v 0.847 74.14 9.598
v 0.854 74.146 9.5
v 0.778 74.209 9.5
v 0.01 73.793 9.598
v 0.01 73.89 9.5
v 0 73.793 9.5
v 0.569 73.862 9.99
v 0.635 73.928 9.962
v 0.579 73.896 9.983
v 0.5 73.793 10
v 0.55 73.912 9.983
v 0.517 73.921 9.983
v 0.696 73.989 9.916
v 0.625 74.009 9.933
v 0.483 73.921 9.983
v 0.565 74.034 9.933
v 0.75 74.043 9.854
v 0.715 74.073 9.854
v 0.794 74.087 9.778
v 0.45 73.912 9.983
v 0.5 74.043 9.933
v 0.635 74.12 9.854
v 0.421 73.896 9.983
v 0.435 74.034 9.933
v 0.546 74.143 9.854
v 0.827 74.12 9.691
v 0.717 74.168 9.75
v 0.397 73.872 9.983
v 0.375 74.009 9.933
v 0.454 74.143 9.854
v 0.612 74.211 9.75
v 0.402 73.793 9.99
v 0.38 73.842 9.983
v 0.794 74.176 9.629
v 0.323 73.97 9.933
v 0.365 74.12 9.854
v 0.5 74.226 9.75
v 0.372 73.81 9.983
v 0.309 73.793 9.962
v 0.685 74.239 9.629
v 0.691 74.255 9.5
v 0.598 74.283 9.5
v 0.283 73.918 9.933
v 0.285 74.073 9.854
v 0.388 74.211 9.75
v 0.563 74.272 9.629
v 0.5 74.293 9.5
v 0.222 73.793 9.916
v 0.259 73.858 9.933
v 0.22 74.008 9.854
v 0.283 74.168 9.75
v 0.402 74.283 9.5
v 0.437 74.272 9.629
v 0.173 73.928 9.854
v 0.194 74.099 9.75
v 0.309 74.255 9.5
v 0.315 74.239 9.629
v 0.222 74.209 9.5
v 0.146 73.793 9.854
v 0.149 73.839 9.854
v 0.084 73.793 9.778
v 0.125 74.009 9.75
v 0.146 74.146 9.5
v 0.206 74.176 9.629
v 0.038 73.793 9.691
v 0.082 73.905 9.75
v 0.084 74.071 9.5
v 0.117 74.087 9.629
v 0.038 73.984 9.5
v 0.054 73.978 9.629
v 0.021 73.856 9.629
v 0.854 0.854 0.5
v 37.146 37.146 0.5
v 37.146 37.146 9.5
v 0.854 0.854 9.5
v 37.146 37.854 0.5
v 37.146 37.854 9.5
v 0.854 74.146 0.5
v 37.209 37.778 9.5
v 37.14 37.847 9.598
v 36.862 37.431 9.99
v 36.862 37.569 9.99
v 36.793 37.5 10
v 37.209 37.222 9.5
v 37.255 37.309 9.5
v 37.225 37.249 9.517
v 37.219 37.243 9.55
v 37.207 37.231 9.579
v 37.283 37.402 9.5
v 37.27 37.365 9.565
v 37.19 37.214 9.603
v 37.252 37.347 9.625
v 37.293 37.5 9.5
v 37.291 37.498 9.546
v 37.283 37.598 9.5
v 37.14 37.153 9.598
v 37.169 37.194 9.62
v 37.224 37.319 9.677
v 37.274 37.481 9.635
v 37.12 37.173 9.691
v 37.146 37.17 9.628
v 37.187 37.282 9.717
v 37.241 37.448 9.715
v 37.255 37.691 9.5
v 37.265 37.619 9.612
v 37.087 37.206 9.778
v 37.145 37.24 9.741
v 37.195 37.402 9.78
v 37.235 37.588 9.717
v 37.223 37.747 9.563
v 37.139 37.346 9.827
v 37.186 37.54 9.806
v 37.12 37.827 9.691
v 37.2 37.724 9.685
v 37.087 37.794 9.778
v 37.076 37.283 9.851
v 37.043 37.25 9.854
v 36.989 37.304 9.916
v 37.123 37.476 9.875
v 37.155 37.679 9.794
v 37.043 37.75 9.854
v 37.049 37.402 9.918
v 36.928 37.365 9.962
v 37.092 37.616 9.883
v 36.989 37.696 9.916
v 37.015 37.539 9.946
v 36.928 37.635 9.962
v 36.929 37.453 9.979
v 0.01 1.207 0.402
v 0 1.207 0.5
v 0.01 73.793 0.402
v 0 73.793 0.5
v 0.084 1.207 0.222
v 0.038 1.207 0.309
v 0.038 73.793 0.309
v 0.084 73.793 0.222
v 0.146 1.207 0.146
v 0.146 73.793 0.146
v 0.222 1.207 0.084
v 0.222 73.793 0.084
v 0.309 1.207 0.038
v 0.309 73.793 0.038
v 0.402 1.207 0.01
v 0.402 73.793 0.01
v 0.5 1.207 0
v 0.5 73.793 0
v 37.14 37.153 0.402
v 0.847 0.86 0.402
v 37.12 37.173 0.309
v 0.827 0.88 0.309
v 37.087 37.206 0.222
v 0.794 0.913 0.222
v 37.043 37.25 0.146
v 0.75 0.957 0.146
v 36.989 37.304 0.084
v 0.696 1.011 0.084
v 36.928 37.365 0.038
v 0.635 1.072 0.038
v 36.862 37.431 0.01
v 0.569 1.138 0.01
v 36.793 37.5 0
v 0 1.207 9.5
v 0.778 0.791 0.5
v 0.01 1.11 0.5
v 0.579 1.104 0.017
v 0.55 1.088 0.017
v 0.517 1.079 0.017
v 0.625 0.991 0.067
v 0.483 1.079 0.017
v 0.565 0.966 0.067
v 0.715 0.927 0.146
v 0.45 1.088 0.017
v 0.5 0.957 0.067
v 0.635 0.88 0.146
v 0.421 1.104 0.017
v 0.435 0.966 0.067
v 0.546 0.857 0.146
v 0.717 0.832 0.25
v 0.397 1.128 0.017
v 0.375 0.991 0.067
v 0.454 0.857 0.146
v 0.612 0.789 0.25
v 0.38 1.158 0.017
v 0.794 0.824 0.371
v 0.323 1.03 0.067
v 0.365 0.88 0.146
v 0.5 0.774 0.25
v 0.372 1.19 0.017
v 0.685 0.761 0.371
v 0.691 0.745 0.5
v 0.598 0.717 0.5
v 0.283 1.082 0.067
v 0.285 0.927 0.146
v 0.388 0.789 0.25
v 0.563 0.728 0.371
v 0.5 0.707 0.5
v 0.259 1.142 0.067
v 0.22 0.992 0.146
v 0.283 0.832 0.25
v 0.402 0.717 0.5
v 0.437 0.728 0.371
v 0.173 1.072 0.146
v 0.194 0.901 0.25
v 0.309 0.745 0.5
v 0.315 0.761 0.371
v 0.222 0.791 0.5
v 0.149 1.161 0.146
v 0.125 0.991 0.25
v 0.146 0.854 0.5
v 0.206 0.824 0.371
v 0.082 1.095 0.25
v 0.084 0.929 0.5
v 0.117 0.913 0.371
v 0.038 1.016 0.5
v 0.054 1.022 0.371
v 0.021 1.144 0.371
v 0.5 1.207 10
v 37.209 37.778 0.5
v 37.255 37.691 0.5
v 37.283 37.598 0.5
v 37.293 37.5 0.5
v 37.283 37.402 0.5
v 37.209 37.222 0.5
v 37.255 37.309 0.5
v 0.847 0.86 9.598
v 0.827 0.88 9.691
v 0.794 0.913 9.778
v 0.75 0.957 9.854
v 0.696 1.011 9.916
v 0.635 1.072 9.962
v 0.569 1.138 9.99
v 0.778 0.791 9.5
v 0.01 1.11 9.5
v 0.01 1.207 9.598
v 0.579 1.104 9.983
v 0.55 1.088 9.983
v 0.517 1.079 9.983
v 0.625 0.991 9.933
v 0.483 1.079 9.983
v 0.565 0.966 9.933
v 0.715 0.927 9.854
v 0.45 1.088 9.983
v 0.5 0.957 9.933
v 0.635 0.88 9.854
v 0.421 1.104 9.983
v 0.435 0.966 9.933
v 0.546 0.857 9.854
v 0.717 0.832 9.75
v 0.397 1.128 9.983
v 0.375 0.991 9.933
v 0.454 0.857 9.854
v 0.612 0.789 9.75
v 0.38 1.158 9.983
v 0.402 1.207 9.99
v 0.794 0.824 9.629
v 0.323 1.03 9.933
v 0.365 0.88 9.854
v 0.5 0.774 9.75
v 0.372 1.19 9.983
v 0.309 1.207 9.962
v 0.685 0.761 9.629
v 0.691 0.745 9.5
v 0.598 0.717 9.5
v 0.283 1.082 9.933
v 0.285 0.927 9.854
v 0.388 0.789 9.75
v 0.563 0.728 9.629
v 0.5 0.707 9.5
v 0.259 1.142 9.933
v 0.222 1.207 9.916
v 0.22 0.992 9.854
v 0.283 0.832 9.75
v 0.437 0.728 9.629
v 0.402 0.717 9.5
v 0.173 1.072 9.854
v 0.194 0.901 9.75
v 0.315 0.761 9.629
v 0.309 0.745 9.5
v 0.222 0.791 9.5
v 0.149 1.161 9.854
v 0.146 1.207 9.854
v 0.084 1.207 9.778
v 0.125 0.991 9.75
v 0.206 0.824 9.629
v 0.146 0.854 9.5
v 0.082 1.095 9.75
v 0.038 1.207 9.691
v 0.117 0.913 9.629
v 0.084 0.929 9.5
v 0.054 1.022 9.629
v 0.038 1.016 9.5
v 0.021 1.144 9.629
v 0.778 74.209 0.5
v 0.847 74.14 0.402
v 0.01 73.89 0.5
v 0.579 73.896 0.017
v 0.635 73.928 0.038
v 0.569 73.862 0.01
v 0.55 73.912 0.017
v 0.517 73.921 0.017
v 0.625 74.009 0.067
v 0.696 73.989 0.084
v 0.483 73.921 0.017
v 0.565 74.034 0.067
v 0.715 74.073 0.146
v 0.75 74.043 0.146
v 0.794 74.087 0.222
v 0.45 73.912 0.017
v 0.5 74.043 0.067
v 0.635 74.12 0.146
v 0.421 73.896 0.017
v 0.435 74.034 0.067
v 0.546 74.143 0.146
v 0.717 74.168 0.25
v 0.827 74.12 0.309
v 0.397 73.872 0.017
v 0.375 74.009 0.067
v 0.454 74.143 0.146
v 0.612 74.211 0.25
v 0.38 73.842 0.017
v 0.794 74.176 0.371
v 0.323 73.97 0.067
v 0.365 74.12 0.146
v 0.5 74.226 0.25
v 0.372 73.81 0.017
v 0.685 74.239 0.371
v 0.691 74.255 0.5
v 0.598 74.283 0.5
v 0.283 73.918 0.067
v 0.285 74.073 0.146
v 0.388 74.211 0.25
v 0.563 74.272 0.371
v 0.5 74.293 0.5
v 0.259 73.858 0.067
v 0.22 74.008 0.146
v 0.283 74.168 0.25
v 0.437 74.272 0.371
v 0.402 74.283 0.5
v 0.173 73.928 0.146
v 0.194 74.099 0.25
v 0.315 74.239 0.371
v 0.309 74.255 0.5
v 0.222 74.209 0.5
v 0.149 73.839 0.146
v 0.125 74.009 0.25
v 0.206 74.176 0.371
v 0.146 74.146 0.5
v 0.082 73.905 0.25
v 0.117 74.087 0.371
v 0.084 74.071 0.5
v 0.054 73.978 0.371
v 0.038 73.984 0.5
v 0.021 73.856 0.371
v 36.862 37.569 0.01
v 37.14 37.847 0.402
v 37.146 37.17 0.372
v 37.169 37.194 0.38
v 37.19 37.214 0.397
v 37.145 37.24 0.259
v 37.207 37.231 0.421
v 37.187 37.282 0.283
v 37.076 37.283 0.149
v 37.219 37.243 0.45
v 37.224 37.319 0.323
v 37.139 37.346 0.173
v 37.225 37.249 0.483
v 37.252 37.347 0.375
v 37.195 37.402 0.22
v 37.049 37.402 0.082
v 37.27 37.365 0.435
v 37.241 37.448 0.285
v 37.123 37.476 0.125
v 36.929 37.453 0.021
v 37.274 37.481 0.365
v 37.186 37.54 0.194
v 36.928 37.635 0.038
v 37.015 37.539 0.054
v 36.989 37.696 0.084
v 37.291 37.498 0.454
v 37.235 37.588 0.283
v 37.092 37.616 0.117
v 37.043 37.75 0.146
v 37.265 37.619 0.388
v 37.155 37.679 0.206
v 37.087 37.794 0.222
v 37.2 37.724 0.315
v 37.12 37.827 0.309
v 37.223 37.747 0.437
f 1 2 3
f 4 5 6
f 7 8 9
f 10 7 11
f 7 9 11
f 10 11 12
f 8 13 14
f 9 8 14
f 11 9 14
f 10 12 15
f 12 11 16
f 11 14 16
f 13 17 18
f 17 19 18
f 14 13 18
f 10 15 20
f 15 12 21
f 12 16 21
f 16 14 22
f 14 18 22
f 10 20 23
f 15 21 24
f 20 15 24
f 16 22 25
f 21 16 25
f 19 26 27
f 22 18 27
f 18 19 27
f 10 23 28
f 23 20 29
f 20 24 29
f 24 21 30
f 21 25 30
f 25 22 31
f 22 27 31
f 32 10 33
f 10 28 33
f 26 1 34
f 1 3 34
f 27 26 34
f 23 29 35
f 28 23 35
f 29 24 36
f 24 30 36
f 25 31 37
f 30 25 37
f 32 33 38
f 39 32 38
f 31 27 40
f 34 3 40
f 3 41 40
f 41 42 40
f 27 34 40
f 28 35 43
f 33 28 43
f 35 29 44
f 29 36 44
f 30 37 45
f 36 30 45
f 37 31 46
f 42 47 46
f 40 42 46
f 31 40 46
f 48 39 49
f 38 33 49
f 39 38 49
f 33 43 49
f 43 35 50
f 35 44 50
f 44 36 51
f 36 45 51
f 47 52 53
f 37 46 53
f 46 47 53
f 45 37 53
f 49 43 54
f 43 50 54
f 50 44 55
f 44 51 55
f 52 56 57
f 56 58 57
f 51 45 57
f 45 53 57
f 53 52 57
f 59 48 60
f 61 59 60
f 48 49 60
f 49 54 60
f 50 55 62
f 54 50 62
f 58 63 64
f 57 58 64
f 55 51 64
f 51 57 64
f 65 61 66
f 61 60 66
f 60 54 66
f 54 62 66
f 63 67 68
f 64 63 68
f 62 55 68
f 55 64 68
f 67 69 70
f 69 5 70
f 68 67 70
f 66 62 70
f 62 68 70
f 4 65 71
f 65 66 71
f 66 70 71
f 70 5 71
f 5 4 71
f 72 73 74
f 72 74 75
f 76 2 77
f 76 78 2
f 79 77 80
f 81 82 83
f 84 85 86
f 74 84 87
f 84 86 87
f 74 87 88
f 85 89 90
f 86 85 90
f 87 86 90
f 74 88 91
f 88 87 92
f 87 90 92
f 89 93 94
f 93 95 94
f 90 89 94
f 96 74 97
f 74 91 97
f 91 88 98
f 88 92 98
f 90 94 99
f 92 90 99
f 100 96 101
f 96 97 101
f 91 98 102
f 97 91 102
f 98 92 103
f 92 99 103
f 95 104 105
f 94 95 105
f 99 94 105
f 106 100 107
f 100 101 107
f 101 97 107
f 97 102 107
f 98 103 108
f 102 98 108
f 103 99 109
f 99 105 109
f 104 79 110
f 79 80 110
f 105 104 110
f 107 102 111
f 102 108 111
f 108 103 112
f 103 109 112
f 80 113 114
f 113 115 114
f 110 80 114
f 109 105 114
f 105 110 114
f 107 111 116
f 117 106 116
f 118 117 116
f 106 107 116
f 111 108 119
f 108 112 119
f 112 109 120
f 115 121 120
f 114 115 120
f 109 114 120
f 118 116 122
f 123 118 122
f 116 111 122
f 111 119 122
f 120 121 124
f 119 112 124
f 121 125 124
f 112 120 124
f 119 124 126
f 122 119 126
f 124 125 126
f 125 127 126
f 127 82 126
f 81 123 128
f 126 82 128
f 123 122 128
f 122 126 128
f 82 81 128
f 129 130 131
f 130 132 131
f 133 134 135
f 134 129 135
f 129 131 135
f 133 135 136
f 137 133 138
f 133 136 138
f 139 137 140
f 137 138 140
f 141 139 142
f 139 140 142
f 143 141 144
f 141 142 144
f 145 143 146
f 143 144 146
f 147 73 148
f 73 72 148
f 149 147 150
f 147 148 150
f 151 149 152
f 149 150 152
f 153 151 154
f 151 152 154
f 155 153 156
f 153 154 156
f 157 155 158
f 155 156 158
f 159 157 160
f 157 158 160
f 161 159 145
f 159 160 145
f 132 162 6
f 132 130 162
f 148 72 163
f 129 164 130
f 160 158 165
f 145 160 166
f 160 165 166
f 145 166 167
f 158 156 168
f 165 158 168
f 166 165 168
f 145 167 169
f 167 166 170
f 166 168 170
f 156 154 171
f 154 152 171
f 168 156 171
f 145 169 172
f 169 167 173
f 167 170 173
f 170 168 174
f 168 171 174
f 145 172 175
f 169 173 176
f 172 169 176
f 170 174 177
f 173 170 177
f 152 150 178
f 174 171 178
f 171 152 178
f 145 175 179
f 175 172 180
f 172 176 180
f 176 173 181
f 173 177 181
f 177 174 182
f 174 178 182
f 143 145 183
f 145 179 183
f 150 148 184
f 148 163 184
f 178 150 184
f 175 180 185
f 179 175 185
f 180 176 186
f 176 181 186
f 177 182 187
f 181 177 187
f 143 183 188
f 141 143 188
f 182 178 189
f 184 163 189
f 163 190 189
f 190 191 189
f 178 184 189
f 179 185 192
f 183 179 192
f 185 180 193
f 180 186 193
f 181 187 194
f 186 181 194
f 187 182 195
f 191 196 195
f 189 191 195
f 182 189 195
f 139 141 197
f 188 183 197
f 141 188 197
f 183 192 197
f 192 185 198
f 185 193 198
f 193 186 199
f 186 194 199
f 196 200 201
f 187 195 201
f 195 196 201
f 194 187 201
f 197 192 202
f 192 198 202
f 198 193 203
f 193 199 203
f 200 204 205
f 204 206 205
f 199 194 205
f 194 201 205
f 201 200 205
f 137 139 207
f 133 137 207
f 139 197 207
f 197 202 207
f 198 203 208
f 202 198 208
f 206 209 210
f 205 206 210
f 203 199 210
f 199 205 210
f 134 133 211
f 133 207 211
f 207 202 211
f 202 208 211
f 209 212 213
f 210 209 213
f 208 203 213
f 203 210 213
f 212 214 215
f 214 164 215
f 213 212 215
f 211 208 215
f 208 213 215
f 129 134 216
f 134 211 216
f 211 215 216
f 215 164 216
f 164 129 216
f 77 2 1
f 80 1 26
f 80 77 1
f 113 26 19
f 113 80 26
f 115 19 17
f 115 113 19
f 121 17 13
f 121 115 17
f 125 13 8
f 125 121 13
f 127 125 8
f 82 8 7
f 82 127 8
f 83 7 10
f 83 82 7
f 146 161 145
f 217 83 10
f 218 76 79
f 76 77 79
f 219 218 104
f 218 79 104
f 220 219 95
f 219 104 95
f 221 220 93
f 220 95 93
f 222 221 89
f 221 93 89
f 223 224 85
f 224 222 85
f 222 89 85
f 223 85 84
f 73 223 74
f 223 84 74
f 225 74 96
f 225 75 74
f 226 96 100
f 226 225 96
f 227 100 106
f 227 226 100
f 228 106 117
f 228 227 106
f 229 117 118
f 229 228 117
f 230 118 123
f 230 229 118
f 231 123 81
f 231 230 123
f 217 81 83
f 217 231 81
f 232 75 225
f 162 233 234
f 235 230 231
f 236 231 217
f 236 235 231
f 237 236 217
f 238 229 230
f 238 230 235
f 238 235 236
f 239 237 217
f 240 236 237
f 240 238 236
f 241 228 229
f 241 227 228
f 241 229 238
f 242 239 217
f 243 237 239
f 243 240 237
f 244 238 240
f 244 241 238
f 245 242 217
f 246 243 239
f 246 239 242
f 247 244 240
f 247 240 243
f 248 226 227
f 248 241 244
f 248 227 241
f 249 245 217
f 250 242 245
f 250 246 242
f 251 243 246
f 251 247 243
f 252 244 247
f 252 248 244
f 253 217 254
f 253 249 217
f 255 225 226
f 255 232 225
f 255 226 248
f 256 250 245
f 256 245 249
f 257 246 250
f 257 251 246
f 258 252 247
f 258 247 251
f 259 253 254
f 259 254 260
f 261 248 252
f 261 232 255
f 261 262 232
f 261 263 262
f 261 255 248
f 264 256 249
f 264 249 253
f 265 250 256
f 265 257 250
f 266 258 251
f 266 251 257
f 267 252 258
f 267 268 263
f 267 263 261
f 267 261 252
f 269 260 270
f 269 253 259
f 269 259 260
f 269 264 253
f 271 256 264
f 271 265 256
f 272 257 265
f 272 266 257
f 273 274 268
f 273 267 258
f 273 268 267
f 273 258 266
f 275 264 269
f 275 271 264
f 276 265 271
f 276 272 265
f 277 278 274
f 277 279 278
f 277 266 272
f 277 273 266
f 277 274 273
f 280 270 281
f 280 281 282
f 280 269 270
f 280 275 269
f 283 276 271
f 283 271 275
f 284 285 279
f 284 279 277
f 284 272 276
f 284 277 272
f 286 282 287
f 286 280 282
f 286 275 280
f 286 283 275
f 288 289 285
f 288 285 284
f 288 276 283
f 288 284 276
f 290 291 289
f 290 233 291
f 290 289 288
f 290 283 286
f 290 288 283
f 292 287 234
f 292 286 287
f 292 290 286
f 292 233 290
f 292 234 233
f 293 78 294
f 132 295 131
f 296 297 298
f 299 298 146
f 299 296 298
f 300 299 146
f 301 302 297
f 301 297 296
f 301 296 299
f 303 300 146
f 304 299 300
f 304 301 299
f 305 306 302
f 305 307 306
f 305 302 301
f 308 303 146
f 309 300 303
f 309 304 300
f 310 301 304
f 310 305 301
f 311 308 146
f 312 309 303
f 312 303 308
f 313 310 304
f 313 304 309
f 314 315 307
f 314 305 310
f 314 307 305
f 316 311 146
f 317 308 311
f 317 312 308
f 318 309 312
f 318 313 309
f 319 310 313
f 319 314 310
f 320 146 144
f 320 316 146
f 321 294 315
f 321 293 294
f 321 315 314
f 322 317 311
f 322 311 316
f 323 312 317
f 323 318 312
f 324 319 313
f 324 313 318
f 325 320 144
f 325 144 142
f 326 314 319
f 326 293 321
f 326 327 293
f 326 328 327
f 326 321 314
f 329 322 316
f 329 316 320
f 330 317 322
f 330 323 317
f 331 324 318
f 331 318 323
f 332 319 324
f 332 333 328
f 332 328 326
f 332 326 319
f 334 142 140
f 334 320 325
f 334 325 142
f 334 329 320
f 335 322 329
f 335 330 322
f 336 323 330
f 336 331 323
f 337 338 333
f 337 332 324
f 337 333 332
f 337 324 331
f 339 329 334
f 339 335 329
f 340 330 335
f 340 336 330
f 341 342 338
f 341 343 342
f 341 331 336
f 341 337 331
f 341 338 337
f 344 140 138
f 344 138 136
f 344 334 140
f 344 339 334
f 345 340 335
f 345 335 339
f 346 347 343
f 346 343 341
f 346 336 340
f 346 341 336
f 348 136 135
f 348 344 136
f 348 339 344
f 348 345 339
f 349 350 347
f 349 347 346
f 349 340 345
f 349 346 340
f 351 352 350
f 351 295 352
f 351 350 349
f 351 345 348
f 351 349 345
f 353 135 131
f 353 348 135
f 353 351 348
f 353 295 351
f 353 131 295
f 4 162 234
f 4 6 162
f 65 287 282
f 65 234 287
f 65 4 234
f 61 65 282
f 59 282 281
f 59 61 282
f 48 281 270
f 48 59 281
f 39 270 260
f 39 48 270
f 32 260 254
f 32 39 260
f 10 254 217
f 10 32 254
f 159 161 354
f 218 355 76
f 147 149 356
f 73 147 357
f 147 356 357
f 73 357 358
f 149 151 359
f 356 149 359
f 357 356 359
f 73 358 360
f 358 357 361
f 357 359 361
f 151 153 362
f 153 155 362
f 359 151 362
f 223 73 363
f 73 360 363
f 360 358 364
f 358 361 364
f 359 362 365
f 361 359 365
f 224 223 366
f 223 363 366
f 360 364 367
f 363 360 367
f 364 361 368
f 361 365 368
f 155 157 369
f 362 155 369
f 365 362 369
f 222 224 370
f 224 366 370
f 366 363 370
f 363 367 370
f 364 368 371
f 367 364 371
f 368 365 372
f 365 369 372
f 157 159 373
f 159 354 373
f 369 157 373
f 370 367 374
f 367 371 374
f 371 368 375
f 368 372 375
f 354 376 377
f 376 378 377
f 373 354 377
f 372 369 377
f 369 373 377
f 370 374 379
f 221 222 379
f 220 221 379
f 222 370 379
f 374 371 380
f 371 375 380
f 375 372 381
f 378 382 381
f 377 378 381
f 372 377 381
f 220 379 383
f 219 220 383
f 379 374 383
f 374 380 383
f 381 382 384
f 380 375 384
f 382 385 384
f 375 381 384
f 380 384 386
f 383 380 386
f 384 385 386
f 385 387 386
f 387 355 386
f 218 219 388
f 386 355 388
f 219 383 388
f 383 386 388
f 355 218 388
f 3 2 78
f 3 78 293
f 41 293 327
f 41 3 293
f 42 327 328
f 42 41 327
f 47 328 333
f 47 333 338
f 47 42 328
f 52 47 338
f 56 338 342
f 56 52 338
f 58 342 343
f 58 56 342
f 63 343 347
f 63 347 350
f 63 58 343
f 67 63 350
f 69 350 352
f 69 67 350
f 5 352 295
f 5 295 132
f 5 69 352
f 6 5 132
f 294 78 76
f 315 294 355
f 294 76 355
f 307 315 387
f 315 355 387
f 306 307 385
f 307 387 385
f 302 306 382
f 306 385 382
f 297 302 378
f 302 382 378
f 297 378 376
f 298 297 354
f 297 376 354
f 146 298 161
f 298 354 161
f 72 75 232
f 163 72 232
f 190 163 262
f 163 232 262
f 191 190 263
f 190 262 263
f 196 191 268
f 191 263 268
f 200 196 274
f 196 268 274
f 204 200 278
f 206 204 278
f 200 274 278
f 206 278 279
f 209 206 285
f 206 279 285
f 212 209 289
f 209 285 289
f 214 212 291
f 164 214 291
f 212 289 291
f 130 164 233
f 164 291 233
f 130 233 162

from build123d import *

# Parameters (mm, degrees)
EXTRUDE_1_DEPTH = 10
FILLET_1_R      = 0.5


with BuildPart() as part:
    # 草图1 → 凸台-拉伸1 (new body)
    with BuildSketch(Plane.XY):
        Polygon((0, 75), (37.5, 37.5), (0, 0), align=None)
    extrude(amount=EXTRUDE_1_DEPTH)

    # 圆角1
    fillet_1_edges = [part.edges().sort_by_distance(p)[0] for p in [
        (18.75, 56.25, 10),
        (18.75, 56.25, 0),
        (0, 37.5, 10),
        (18.75, 18.75, 0),
        (0, 37.5, 0),
        (0, 75, 5),
        (37.5, 37.5, 5),
        (0, 0, 5),
        (18.75, 18.75, 10),
    ]]
    fillet(fillet_1_edges, radius=FILLET_1_R)


solid = part.part
